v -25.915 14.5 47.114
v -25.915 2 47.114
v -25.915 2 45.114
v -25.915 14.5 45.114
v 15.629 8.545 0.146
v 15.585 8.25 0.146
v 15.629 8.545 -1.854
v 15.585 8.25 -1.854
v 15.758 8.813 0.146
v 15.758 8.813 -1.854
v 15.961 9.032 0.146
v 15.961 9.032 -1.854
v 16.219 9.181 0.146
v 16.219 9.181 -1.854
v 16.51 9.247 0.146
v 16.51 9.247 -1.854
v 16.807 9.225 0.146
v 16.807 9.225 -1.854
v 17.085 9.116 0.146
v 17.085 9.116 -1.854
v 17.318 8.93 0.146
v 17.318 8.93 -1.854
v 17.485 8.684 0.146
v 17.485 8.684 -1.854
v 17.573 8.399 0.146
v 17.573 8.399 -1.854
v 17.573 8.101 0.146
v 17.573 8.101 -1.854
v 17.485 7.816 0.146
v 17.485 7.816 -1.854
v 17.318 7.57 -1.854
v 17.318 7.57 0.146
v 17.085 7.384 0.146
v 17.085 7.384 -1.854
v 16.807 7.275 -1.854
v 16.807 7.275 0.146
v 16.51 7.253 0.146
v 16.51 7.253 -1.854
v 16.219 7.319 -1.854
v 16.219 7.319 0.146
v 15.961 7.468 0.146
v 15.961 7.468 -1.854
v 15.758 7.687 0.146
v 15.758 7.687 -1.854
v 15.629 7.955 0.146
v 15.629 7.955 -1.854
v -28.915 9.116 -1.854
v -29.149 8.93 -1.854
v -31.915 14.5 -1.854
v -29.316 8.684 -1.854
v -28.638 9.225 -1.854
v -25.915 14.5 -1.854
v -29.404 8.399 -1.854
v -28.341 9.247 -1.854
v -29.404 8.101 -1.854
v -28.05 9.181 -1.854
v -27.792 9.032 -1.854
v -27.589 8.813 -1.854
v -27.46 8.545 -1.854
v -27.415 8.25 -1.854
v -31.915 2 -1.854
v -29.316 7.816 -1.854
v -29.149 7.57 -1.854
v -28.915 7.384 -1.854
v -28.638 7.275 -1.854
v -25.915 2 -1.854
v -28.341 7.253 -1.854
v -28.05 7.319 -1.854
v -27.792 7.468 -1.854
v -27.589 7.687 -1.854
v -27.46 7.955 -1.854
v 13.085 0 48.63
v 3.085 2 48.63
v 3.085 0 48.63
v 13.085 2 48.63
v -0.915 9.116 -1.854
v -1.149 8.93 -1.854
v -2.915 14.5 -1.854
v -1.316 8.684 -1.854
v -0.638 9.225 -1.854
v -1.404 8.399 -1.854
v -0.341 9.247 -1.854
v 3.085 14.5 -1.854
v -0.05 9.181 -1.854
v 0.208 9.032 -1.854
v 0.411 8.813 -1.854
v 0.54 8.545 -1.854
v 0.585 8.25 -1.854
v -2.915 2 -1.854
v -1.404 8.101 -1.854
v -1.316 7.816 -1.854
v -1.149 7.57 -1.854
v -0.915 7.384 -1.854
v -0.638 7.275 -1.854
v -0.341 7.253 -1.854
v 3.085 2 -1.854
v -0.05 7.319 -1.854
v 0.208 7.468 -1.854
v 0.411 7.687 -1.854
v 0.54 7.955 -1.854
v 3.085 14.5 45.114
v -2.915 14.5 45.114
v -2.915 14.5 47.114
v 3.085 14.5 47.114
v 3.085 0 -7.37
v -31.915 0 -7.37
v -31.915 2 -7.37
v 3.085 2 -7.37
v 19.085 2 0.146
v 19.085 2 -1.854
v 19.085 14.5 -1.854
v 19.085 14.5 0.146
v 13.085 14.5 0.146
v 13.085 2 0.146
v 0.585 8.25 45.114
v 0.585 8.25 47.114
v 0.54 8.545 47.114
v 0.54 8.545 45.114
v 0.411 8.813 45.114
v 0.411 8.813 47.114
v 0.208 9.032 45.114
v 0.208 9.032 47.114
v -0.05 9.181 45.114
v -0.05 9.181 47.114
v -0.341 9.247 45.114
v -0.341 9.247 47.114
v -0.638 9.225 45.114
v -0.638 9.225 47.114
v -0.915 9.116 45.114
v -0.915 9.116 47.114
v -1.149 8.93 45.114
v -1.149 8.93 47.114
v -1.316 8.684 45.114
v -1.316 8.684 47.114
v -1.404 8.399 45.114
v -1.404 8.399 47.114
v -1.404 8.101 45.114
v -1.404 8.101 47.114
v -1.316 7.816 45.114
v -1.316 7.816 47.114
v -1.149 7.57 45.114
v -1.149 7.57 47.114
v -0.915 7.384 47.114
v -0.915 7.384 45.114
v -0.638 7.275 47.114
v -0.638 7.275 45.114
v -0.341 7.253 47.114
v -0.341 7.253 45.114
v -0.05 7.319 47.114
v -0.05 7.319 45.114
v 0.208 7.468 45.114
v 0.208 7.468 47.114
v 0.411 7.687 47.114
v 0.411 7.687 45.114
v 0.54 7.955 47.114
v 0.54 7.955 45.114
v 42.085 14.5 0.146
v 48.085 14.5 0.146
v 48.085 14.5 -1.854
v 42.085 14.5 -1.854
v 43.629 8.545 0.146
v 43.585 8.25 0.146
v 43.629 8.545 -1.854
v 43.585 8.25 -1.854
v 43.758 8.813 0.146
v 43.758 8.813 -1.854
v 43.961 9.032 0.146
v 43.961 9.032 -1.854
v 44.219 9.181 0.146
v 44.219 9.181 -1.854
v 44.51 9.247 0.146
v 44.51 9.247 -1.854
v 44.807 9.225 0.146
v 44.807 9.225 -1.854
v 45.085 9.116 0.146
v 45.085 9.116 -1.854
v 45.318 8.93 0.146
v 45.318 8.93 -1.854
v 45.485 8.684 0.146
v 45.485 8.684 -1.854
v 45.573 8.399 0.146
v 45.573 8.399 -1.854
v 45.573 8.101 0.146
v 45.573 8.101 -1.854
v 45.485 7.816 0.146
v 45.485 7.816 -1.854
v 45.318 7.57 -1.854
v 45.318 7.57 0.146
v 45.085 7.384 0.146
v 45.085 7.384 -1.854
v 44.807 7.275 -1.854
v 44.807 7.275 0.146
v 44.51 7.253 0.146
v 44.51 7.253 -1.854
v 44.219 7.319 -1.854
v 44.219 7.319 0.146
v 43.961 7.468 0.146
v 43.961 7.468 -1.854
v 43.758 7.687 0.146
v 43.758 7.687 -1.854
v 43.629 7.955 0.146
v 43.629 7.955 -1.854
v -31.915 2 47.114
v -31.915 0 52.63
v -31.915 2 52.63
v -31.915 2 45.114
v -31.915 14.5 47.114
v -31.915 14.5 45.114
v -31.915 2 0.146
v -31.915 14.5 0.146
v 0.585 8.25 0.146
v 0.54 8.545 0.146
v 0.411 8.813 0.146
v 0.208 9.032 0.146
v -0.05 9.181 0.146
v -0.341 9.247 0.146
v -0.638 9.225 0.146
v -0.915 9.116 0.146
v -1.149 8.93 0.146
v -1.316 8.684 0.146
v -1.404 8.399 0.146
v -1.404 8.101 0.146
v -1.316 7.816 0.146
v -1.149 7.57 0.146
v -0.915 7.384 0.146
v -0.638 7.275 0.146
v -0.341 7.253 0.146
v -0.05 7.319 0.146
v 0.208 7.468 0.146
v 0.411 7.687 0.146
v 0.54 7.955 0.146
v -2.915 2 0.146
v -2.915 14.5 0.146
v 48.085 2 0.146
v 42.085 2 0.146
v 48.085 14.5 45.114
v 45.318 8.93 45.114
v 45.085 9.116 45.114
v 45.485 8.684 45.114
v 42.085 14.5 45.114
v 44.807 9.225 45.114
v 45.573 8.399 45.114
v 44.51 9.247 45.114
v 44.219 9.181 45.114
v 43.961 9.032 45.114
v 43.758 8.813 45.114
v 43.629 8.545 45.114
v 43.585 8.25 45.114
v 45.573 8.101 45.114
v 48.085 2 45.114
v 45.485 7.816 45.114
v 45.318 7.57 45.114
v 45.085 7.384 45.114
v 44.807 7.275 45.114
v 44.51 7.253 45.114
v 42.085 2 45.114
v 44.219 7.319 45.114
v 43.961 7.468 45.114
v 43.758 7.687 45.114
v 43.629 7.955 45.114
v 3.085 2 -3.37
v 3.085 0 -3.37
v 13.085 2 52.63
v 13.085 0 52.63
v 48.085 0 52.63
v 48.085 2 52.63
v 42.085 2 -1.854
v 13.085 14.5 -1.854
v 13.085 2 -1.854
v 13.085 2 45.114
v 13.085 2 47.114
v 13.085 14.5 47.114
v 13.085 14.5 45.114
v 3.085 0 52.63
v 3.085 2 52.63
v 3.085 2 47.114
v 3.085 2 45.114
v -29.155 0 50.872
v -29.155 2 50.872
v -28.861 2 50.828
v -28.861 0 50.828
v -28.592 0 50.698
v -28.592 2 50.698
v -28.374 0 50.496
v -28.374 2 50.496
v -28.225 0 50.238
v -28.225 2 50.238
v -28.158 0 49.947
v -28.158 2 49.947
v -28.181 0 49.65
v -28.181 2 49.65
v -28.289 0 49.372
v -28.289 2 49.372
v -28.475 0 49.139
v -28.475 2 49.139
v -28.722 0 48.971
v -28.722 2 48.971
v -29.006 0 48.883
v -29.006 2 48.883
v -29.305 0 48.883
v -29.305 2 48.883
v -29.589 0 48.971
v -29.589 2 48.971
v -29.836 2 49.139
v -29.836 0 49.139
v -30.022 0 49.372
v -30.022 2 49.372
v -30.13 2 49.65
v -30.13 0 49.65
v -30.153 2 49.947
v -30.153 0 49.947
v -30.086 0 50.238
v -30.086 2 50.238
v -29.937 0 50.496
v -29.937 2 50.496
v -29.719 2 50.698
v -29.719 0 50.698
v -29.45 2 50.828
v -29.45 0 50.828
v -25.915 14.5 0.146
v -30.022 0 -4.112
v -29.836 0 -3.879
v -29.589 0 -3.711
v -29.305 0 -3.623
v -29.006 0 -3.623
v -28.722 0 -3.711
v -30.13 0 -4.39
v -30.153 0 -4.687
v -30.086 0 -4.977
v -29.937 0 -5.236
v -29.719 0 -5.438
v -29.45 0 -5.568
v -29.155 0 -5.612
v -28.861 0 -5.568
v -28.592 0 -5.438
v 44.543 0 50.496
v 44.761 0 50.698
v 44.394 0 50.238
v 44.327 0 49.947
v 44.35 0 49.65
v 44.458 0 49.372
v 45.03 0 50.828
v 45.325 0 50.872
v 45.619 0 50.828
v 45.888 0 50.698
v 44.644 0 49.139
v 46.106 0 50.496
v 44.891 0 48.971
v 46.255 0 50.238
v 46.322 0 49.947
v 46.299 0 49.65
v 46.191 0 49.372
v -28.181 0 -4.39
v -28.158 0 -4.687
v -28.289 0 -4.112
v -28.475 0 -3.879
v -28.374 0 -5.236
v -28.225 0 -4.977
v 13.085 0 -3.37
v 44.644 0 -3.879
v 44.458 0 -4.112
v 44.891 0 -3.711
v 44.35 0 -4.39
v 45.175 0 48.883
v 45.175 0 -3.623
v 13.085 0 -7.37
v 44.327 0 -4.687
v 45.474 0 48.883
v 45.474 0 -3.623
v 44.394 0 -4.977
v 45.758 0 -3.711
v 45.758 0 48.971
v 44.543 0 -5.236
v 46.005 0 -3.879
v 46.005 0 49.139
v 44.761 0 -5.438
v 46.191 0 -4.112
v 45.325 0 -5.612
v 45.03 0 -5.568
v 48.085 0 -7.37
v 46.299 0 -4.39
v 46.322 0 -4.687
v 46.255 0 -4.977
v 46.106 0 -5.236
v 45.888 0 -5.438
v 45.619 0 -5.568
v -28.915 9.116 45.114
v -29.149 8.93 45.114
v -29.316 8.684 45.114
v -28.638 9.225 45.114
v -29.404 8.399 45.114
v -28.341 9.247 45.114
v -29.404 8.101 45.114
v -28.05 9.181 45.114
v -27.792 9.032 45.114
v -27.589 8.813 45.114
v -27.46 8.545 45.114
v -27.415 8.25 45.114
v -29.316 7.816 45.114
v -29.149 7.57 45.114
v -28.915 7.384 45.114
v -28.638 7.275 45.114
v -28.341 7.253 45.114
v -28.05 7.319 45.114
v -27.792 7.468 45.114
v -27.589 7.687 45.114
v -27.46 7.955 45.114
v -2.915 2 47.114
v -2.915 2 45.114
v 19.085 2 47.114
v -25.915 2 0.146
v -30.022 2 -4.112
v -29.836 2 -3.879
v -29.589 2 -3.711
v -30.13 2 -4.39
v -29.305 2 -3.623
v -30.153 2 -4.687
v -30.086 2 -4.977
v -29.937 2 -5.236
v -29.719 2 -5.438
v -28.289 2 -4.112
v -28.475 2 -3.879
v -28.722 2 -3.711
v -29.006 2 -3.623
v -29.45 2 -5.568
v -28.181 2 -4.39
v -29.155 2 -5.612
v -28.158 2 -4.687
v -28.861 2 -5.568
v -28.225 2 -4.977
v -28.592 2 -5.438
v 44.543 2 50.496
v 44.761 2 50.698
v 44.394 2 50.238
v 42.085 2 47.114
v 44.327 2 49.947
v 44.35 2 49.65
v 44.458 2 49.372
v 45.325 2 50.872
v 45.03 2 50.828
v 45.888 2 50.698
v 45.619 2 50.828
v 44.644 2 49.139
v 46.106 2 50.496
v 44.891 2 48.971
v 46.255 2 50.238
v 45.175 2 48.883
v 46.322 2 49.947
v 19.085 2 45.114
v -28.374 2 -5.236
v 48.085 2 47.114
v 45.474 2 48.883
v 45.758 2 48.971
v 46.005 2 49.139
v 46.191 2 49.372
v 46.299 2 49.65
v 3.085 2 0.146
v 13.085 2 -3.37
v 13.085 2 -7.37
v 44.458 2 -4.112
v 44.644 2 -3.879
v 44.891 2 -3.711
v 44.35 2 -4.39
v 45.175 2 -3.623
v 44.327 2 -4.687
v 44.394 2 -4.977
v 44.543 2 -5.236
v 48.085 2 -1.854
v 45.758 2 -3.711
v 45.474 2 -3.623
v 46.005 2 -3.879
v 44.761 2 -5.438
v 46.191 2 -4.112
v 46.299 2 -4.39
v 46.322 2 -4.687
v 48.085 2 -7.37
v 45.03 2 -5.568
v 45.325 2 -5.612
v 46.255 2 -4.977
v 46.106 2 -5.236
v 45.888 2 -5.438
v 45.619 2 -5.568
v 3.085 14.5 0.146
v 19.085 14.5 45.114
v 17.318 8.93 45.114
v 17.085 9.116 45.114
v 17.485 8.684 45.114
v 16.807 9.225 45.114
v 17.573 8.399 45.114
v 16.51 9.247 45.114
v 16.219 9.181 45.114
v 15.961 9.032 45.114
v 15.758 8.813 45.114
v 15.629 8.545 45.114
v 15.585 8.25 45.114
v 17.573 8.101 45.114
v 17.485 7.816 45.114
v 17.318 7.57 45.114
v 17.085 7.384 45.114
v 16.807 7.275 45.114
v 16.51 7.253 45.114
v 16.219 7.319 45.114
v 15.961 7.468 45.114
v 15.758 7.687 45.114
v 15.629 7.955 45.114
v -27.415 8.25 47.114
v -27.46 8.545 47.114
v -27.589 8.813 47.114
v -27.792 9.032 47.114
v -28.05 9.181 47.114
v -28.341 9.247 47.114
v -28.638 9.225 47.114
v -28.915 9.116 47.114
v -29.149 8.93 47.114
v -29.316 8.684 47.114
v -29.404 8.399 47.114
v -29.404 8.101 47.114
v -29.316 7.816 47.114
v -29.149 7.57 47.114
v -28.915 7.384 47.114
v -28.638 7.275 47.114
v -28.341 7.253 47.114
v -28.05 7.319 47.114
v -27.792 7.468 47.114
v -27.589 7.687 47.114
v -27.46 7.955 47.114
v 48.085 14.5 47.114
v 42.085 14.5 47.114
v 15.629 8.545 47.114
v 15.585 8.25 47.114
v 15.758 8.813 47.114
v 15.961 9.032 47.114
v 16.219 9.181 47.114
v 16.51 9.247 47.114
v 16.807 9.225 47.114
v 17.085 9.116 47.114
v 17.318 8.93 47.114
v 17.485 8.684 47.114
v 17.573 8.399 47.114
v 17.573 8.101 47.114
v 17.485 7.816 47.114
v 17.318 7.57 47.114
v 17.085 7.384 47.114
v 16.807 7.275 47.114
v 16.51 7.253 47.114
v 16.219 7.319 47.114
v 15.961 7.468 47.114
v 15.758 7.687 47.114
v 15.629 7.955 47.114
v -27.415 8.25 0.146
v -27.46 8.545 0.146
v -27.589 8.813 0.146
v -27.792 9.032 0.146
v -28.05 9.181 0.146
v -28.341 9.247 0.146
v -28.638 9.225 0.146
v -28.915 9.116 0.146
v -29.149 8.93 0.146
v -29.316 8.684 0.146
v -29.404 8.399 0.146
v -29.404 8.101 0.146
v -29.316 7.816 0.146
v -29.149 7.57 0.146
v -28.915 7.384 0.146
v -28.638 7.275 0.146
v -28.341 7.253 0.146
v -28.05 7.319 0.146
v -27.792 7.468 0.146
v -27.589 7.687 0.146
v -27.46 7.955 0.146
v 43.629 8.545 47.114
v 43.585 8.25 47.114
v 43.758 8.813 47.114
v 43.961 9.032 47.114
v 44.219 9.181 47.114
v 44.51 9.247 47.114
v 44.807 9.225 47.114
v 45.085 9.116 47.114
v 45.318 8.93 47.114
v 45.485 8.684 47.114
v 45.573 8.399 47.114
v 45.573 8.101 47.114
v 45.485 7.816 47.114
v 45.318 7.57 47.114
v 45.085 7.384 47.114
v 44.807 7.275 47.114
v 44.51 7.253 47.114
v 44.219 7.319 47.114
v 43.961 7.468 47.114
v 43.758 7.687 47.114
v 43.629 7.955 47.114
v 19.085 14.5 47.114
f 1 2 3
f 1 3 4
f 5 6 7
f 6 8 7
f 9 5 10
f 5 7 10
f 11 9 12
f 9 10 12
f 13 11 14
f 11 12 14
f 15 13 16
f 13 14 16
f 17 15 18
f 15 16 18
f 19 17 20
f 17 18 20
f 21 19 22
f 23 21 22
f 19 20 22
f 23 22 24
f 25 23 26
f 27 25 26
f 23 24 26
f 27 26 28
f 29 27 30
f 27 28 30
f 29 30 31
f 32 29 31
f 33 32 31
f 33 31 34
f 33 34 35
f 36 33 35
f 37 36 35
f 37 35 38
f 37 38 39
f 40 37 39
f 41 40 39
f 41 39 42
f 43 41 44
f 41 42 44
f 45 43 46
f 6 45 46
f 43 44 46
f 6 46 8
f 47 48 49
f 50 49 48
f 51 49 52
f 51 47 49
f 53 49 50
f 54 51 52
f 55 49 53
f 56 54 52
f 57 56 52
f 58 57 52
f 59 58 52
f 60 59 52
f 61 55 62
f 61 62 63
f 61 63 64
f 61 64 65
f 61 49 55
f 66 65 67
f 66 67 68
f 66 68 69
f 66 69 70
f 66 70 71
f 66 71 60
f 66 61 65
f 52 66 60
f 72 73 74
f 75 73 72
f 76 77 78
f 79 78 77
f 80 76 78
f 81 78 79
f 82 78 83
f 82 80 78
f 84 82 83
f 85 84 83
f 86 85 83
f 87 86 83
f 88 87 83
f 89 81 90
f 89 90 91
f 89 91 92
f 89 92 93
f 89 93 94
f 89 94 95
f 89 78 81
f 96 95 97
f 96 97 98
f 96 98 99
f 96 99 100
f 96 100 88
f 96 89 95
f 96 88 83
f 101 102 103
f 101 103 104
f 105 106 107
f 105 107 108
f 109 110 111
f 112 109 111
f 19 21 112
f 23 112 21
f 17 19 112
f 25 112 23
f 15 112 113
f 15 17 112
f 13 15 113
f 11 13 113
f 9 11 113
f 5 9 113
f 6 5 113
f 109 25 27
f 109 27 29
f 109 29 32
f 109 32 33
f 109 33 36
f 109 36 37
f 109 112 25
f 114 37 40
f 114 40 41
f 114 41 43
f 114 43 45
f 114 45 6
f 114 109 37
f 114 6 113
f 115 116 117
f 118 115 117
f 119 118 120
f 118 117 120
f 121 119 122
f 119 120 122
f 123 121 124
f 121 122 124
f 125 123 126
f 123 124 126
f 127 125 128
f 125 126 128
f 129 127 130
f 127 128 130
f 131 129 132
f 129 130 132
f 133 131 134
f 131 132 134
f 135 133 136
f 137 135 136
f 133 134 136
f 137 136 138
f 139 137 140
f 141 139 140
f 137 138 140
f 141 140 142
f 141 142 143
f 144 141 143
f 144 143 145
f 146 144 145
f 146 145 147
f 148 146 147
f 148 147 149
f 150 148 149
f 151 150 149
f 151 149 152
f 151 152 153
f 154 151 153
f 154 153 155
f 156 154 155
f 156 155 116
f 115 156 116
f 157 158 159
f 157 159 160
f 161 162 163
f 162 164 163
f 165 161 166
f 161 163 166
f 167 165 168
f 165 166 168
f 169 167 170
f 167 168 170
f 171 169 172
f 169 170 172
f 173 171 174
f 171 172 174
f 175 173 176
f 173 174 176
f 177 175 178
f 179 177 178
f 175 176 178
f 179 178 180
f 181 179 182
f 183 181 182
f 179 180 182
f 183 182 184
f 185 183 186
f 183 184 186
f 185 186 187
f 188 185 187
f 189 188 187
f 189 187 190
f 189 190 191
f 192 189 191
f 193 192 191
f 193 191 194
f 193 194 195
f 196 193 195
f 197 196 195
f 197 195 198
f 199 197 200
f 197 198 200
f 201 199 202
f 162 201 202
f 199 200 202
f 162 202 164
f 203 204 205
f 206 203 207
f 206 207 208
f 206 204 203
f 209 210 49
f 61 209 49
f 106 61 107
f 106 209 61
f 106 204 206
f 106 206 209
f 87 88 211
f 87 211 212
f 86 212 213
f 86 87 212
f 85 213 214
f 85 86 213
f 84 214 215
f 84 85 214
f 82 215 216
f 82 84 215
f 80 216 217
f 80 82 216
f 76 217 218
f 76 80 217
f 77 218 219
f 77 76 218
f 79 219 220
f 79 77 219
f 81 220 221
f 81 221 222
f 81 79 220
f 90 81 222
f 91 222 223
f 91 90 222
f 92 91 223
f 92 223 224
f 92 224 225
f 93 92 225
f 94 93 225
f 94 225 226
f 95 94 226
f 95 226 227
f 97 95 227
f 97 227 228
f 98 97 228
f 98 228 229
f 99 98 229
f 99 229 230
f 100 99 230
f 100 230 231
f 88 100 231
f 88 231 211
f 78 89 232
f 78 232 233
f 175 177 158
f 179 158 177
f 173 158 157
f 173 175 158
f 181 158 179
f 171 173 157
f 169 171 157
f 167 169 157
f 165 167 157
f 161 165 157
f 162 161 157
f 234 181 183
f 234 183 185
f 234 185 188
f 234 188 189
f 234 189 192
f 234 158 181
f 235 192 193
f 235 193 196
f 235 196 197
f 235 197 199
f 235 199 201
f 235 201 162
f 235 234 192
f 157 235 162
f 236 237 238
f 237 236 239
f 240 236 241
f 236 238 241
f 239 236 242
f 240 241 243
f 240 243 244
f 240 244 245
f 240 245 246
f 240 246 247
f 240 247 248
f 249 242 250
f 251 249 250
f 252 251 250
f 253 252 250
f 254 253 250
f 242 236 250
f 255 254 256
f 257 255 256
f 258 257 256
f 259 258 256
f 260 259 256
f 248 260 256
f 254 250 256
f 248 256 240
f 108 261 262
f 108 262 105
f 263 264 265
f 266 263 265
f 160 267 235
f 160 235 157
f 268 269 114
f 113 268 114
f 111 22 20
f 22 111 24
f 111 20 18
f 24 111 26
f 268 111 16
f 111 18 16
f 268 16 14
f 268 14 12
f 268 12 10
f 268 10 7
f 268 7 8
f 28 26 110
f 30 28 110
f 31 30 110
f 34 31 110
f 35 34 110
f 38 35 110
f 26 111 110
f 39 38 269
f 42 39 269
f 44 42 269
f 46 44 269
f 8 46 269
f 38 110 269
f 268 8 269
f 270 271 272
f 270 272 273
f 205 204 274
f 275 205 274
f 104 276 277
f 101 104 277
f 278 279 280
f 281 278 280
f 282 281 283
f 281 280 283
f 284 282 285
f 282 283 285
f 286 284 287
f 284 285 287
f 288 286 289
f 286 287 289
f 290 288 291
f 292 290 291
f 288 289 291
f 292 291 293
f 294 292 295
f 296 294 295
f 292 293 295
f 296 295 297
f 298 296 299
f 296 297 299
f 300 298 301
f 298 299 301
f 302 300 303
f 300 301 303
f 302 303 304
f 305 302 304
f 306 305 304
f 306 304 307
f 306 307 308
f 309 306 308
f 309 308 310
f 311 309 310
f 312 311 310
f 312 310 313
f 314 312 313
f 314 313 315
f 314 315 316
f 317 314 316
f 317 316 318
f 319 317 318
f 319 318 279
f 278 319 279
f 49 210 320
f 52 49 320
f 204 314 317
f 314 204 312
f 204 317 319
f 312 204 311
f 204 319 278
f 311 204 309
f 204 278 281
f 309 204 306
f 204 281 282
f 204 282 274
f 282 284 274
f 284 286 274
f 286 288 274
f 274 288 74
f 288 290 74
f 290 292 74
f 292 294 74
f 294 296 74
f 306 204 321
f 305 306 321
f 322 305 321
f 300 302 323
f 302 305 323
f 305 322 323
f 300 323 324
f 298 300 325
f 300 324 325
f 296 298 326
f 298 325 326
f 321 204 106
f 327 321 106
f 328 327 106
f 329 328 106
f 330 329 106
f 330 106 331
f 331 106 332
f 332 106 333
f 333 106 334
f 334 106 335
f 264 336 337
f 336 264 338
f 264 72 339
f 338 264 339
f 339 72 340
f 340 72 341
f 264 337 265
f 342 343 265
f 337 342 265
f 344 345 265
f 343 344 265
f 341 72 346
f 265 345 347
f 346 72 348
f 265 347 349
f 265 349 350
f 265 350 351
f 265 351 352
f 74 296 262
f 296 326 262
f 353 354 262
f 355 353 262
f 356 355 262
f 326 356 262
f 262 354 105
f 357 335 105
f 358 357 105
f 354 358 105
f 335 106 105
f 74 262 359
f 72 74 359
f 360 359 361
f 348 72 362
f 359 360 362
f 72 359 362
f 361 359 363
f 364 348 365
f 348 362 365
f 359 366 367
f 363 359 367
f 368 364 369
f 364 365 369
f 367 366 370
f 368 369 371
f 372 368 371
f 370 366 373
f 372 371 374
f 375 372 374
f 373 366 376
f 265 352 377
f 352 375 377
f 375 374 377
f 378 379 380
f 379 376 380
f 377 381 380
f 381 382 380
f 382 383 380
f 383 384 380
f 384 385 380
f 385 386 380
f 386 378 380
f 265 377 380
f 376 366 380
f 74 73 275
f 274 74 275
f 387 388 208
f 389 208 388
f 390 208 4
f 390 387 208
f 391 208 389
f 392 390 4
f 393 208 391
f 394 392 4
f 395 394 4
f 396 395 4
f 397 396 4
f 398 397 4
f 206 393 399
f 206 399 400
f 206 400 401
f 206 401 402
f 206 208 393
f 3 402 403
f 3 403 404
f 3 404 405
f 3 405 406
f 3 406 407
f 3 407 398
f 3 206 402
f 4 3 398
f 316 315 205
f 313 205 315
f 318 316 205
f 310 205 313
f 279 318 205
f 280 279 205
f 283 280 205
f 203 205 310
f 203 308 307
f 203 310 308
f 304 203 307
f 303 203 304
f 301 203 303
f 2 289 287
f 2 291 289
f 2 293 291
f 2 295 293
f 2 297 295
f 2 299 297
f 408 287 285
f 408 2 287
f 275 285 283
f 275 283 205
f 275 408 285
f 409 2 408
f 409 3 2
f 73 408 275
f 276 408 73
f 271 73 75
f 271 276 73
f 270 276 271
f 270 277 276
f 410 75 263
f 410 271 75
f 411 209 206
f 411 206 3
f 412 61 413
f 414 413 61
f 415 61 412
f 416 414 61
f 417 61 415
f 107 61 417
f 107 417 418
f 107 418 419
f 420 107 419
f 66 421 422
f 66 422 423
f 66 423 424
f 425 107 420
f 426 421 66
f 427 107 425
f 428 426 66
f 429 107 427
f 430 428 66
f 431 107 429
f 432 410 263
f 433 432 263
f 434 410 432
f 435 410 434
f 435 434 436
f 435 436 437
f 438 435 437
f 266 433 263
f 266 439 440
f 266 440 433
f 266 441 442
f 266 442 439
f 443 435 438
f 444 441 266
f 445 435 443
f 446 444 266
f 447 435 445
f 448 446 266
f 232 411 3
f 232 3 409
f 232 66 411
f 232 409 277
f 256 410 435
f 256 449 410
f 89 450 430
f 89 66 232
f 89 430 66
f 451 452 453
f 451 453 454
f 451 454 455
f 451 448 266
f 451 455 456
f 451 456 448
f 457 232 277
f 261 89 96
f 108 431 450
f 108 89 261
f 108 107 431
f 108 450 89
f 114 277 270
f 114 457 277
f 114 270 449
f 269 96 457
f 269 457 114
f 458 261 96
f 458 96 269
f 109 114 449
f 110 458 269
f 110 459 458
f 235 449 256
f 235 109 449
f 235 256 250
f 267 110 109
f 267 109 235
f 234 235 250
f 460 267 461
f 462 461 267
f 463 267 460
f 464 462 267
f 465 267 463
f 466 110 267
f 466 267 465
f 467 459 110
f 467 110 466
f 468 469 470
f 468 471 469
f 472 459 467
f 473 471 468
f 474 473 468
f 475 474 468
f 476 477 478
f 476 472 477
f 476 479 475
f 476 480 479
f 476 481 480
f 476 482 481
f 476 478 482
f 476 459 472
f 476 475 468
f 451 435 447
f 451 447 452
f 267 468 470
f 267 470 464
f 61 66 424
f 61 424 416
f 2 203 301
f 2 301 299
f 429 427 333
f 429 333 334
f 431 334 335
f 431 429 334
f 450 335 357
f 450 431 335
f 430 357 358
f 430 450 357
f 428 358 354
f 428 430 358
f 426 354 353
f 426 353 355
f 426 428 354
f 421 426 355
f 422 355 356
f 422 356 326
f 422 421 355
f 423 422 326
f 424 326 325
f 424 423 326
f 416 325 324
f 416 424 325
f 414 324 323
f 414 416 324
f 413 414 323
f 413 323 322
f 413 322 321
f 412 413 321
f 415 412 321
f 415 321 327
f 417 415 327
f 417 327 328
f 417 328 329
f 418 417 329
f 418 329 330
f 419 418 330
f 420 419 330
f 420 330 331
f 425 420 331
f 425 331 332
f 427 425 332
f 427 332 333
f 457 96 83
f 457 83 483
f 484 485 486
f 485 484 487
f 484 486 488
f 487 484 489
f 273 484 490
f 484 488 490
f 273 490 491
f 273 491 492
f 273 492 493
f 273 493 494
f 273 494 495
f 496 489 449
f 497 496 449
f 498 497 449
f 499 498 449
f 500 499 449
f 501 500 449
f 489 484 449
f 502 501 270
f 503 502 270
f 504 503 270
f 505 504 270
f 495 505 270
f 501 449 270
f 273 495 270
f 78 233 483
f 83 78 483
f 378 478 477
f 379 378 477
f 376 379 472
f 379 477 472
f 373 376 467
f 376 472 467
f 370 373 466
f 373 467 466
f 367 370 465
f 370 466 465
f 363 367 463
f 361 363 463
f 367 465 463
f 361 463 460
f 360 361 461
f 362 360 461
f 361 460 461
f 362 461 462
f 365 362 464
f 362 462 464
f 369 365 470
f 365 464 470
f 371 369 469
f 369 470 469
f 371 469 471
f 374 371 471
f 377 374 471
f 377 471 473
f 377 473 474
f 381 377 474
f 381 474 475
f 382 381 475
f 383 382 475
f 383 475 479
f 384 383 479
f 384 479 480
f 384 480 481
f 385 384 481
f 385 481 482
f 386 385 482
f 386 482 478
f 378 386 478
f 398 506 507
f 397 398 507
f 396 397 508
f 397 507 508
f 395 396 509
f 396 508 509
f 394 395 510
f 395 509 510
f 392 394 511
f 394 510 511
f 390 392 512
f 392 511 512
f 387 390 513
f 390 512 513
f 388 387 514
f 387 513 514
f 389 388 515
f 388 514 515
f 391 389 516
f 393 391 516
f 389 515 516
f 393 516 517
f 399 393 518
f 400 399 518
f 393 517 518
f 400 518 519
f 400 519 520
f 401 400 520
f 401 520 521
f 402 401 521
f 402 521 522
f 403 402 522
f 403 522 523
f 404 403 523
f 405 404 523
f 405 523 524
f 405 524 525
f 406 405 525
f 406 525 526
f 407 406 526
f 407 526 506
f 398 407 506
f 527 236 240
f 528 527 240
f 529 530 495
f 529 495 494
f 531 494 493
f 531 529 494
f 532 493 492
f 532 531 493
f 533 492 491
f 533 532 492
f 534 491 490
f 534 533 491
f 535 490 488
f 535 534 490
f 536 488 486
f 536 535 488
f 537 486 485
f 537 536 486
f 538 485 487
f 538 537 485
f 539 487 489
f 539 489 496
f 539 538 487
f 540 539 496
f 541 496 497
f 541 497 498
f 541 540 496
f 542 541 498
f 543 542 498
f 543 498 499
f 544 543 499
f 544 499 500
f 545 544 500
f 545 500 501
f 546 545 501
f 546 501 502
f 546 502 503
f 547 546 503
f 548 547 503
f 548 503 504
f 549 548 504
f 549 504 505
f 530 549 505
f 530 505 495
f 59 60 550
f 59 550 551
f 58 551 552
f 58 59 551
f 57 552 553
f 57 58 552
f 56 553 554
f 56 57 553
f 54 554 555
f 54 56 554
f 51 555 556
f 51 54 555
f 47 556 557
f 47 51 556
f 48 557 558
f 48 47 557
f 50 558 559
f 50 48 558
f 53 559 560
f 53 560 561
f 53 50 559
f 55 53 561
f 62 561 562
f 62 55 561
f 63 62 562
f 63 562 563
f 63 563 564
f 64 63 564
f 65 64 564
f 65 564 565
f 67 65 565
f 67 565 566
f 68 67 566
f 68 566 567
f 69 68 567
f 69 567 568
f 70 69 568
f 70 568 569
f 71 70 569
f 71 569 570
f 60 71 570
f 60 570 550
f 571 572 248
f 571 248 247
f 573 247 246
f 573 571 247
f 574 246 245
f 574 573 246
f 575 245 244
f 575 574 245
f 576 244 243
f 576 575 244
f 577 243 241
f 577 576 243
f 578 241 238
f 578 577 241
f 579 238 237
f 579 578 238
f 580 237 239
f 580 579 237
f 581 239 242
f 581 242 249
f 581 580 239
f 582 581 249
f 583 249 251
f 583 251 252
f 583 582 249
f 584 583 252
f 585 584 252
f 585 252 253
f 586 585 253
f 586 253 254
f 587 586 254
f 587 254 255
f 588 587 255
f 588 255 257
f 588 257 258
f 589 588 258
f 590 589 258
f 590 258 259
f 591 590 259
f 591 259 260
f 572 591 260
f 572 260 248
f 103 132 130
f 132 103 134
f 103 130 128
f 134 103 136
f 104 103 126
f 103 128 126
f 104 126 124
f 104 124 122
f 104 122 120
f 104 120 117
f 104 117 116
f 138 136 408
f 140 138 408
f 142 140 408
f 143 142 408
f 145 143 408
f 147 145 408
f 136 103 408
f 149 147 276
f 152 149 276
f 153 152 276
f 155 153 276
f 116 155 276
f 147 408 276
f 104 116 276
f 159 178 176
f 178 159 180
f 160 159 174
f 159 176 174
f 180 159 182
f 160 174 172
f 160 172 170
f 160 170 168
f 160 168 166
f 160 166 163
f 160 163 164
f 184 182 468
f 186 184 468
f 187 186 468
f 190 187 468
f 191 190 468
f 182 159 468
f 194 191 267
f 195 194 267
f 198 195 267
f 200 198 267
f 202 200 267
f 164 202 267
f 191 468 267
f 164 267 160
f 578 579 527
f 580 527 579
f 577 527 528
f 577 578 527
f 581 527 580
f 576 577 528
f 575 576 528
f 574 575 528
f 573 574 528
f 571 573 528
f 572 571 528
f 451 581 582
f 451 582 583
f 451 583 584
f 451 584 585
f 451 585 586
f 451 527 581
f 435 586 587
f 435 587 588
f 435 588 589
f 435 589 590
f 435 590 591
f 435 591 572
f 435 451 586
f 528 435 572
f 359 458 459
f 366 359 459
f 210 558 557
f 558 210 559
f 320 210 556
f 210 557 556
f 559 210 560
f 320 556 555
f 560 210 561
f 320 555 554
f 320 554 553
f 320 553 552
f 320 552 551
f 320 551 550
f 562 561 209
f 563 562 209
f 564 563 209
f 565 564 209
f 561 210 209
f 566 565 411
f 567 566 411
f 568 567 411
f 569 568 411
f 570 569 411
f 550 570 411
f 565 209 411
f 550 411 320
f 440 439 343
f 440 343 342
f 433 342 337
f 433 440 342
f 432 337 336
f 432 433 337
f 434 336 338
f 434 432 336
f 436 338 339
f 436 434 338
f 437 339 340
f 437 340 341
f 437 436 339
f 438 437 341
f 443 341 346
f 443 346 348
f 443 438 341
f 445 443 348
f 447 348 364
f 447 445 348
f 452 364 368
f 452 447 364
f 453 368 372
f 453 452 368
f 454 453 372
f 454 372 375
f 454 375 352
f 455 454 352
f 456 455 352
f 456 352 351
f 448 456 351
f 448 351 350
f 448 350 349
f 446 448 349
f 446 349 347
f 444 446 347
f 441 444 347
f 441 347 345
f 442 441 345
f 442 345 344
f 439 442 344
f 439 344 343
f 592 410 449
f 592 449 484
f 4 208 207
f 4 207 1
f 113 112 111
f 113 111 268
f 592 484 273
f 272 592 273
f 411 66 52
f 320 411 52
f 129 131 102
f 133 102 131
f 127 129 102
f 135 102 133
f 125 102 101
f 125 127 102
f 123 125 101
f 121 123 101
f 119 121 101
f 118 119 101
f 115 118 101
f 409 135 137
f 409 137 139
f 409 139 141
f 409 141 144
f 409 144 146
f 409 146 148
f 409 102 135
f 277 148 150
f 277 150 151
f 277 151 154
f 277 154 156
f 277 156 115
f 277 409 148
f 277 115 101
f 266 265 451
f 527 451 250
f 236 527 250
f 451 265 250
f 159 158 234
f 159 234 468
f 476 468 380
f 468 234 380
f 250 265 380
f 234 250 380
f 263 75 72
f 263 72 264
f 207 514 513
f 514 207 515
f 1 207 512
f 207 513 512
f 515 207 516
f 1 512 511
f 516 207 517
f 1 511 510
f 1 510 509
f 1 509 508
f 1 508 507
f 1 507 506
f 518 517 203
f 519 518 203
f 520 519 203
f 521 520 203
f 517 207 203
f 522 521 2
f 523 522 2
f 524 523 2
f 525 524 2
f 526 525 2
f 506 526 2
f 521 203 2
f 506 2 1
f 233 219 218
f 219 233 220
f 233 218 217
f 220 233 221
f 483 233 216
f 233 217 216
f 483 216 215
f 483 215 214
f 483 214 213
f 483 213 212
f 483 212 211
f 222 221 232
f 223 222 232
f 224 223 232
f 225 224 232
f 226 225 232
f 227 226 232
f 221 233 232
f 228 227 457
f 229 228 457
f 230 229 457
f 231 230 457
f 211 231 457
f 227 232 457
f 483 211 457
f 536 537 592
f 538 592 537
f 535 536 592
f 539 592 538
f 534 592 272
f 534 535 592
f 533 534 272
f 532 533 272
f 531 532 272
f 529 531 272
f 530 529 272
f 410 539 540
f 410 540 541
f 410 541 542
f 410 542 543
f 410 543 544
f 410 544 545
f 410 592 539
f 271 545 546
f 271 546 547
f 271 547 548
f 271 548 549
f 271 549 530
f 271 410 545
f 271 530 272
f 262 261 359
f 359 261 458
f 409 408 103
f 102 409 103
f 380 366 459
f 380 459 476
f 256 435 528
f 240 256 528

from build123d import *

# Parameters (mm, degrees)
SKETCH1_W               = 80
SKETCH1_H               = 60
BOSS_EXTRUDE1_DEPTH     = 2
SKETCH2_W               = 35
SKETCH2_H               = 2
BOSS_EXTRUDE2_DEPTH     = 12.5
CUT_EXTRUDE1_REACH      = 76.101
SKETCH3_R               = 1
SKETCH3_W               = 23
SKETCH3_H               = 12.5
MIRROR2_COPY_1_SKETCH_W = 35
MIRROR2_COPY_1_SKETCH_H = 2
MIRROR2_COPY_1_DEPTH    = 12.5
MIRROR2_COPY_2_REACH    = 76.101
MIRROR2_COPY_2_SKETCH_R = 1
MIRROR2_COPY_2_SKETCH_W = 23
MIRROR2_COPY_2_SKETCH_H = 12.5
CUT_EXTRUDE2_REACH      = 74.376
SKETCH4_R               = 1
MIRROR4_COPY_1_REACH    = 74.376
MIRROR4_COPY_1_SKETCH_R = 1
SKETCH5_W               = 10
SKETCH5_H               = 4
CUT_EXTRUDE3_DEPTH      = 10


with BuildPart() as part:
    # Sketch1 → Boss-Extrude1 (new body)
    with BuildSketch(Plane(origin=(0, 0, 0), x_dir=(1, 0, 0), z_dir=(0, 1, 0))):
        with Locations((8.084510341, -22.630080351)):
            Rectangle(SKETCH1_W, SKETCH1_H)
    extrude(amount=BOSS_EXTRUDE1_DEPTH)

    # Sketch2 → Boss-Extrude2 (add)
    with BuildSketch(Plane(origin=(0, 2, 0), x_dir=(1, 0, 0), z_dir=(0, 1, 0))):
        with Locations((-14.415489659, -46.114303401)):
            Rectangle(SKETCH2_W, SKETCH2_H)
    boss_extrude2 = extrude(amount=BOSS_EXTRUDE2_DEPTH)

    # Sketch3 → Cut-Extrude1 (cut, up to next)
    with BuildSketch(Plane.XY.offset(47.114303401), mode=Mode.PRIVATE) as cut_extrude1_sk1:
        with Locations((-0.415489659, 8.25)):
            Circle(SKETCH3_R)
    cut_extrude1_tool1 = extrude(cut_extrude1_sk1.sketch, amount=-CUT_EXTRUDE1_REACH, mode=Mode.PRIVATE) & part.part
    # Sketch3 → Cut-Extrude1 (cut, up to next)
    with BuildSketch(Plane.XY.offset(47.114303401), mode=Mode.PRIVATE) as cut_extrude1_sk2:
        with Locations((-28.415489659, 8.25)):
            Circle(SKETCH3_R)
    cut_extrude1_tool2 = extrude(cut_extrude1_sk2.sketch, amount=-CUT_EXTRUDE1_REACH, mode=Mode.PRIVATE) & part.part
    # Sketch3 → Cut-Extrude1 (cut, up to next)
    with BuildSketch(Plane.XY.offset(47.114303401), mode=Mode.PRIVATE) as cut_extrude1_sk3:
        with Locations((-14.415489659, 8.25)):
            Rectangle(SKETCH3_W, SKETCH3_H)
    cut_extrude1_tool3 = extrude(cut_extrude1_sk3.sketch, amount=-CUT_EXTRUDE1_REACH, mode=Mode.PRIVATE) & part.part
    cut_extrude1_1 = cut_extrude1_tool1.solids().sort_by_distance((-0.41549, 8.25, 47.114303))[0]
    add(cut_extrude1_1, mode=Mode.SUBTRACT)
    cut_extrude1_2 = cut_extrude1_tool2.solids().sort_by_distance((-28.41549, 8.25, 47.114303))[0]
    add(cut_extrude1_2, mode=Mode.SUBTRACT)
    cut_extrude1_3 = cut_extrude1_tool3.solids().sort_by_distance((-14.41549, 8.25, 47.114303))[0]
    add(cut_extrude1_3, mode=Mode.SUBTRACT)
    cut_extrude1 = cut_extrude1_1 + cut_extrude1_2 + cut_extrude1_3  # Cut-Extrude1 as one shape, for the pattern or mirror that repeats it

    # Mirror1: Boss-Extrude2, Cut-Extrude1 across plane
    add(boss_extrude2.mirror(Plane(origin=(8.084510341, 0, 0), x_dir=(0, 0, 1), z_dir=(1, 0, 0))))
    add(cut_extrude1.mirror(Plane(origin=(8.084510341, 0, 0), x_dir=(0, 0, 1), z_dir=(1, 0, 0))), mode=Mode.SUBTRACT)

    # Mirror2: Boss-Extrude2, Cut-Extrude1 across plane
    add(boss_extrude2.mirror(Plane.XY.offset(22.630080351)))
    add(cut_extrude1.mirror(Plane.XY.offset(22.630080351)), mode=Mode.SUBTRACT)

    # Mirror2 copy 1 sketch → Mirror2 copy 1 (add)
    with BuildSketch(Plane(origin=(16.169020682, 2, 45.260160703), x_dir=(-1, 0, 0), z_dir=(0, 1, 0))):
        with Locations((-14.415489659, -46.114303401)):
            Rectangle(MIRROR2_COPY_1_SKETCH_W, MIRROR2_COPY_1_SKETCH_H)
    extrude(amount=MIRROR2_COPY_1_DEPTH)

    # Mirror2 copy 2 sketch → Mirror2 copy 2 (cut, up to next)
    with BuildSketch(Plane(origin=(16.169020682, 0, -1.854142699), x_dir=(-1, 0, 0), z_dir=(0, 0, -1)), mode=Mode.PRIVATE) as mirror2_copy_2_sk1:
        with Locations((-0.415489659, 8.25)):
            Circle(MIRROR2_COPY_2_SKETCH_R)
    mirror2_copy_2_tool1 = extrude(mirror2_copy_2_sk1.sketch, amount=-MIRROR2_COPY_2_REACH, mode=Mode.PRIVATE) & part.part
    # Mirror2 copy 2 sketch → Mirror2 copy 2 (cut, up to next)
    with BuildSketch(Plane(origin=(16.169020682, 0, -1.854142699), x_dir=(-1, 0, 0), z_dir=(0, 0, -1)), mode=Mode.PRIVATE) as mirror2_copy_2_sk2:
        with Locations((-28.415489659, 8.25)):
            Circle(MIRROR2_COPY_2_SKETCH_R)
    mirror2_copy_2_tool2 = extrude(mirror2_copy_2_sk2.sketch, amount=-MIRROR2_COPY_2_REACH, mode=Mode.PRIVATE) & part.part
    # Mirror2 copy 2 sketch → Mirror2 copy 2 (cut, up to next)
    with BuildSketch(Plane(origin=(16.169020682, 0, -1.854142699), x_dir=(-1, 0, 0), z_dir=(0, 0, -1)), mode=Mode.PRIVATE) as mirror2_copy_2_sk3:
        with Locations((-14.415489659, 8.25)):
            Rectangle(MIRROR2_COPY_2_SKETCH_W, MIRROR2_COPY_2_SKETCH_H)
    mirror2_copy_2_tool3 = extrude(mirror2_copy_2_sk3.sketch, amount=-MIRROR2_COPY_2_REACH, mode=Mode.PRIVATE) & part.part
    add(mirror2_copy_2_tool1.solids().sort_by_distance((16.584510682, 8.25, -1.854142297))[0], mode=Mode.SUBTRACT)
    add(mirror2_copy_2_tool2.solids().sort_by_distance((44.584510682, 8.25, -1.854142297))[0], mode=Mode.SUBTRACT)
    add(mirror2_copy_2_tool3.solids().sort_by_distance((30.584510682, 8.25, -1.854142297))[0], mode=Mode.SUBTRACT)

    # Sketch4 → Cut-Extrude2 (cut, up to next)
    with BuildSketch(Plane(origin=(0, 2, 0), x_dir=(1, 0, 0), z_dir=(0, 1, 0)), mode=Mode.PRIVATE) as cut_extrude2_sk1:
        with Locations(Location((-29.155489659, -49.872191876, 0), (0, 0, 270))):
            Circle(SKETCH4_R)
    cut_extrude2_tool1 = extrude(cut_extrude2_sk1.sketch, amount=-CUT_EXTRUDE2_REACH, mode=Mode.PRIVATE) & part.part
    cut_extrude2 = cut_extrude2_tool1.solids().sort_by_distance((-29.15549, 2, 49.872192))[0]
    add(cut_extrude2, mode=Mode.SUBTRACT)

    # Mirror3: Cut-Extrude2 across plane
    add(cut_extrude2.mirror(Plane(origin=(8.084510341, 0, 0), x_dir=(0, 0, 1), z_dir=(1, 0, 0))), mode=Mode.SUBTRACT)

    # Mirror4: Cut-Extrude2 across plane
    add(cut_extrude2.mirror(Plane.XY.offset(22.630080351)), mode=Mode.SUBTRACT)

    # Mirror4 copy 1 sketch → Mirror4 copy 1 (cut, up to next)
    with BuildSketch(Plane(origin=(16.169020682, 2, 45.260160703), x_dir=(-1, 0, 0), z_dir=(0, 1, 0)), mode=Mode.PRIVATE) as mirror4_copy_1_sk1:
        with Locations(Location((-29.155489659, -49.872191876, 0), (0, 0, 270))):
            Circle(MIRROR4_COPY_1_SKETCH_R)
    mirror4_copy_1_tool1 = extrude(mirror4_copy_1_sk1.sketch, amount=-MIRROR4_COPY_1_REACH, mode=Mode.PRIVATE) & part.part
    add(mirror4_copy_1_tool1.solids().sort_by_distance((45.324510682, 2, -4.612031297))[0], mode=Mode.SUBTRACT)

    # Sketch5 → Cut-Extrude3 (cut)
    with BuildSketch(Plane(origin=(0, 2, 0), x_dir=(1, 0, 0), z_dir=(0, 1, 0))):
        with Locations((8.084510341, 5.369919649)):
            Rectangle(SKETCH5_W, SKETCH5_H)
    cut_extrude3 = extrude(amount=-CUT_EXTRUDE3_DEPTH, mode=Mode.SUBTRACT)

    # Mirror5: Cut-Extrude3 across plane
    add(cut_extrude3.mirror(Plane.XY.offset(22.630080351)), mode=Mode.SUBTRACT)


solid = part.part
